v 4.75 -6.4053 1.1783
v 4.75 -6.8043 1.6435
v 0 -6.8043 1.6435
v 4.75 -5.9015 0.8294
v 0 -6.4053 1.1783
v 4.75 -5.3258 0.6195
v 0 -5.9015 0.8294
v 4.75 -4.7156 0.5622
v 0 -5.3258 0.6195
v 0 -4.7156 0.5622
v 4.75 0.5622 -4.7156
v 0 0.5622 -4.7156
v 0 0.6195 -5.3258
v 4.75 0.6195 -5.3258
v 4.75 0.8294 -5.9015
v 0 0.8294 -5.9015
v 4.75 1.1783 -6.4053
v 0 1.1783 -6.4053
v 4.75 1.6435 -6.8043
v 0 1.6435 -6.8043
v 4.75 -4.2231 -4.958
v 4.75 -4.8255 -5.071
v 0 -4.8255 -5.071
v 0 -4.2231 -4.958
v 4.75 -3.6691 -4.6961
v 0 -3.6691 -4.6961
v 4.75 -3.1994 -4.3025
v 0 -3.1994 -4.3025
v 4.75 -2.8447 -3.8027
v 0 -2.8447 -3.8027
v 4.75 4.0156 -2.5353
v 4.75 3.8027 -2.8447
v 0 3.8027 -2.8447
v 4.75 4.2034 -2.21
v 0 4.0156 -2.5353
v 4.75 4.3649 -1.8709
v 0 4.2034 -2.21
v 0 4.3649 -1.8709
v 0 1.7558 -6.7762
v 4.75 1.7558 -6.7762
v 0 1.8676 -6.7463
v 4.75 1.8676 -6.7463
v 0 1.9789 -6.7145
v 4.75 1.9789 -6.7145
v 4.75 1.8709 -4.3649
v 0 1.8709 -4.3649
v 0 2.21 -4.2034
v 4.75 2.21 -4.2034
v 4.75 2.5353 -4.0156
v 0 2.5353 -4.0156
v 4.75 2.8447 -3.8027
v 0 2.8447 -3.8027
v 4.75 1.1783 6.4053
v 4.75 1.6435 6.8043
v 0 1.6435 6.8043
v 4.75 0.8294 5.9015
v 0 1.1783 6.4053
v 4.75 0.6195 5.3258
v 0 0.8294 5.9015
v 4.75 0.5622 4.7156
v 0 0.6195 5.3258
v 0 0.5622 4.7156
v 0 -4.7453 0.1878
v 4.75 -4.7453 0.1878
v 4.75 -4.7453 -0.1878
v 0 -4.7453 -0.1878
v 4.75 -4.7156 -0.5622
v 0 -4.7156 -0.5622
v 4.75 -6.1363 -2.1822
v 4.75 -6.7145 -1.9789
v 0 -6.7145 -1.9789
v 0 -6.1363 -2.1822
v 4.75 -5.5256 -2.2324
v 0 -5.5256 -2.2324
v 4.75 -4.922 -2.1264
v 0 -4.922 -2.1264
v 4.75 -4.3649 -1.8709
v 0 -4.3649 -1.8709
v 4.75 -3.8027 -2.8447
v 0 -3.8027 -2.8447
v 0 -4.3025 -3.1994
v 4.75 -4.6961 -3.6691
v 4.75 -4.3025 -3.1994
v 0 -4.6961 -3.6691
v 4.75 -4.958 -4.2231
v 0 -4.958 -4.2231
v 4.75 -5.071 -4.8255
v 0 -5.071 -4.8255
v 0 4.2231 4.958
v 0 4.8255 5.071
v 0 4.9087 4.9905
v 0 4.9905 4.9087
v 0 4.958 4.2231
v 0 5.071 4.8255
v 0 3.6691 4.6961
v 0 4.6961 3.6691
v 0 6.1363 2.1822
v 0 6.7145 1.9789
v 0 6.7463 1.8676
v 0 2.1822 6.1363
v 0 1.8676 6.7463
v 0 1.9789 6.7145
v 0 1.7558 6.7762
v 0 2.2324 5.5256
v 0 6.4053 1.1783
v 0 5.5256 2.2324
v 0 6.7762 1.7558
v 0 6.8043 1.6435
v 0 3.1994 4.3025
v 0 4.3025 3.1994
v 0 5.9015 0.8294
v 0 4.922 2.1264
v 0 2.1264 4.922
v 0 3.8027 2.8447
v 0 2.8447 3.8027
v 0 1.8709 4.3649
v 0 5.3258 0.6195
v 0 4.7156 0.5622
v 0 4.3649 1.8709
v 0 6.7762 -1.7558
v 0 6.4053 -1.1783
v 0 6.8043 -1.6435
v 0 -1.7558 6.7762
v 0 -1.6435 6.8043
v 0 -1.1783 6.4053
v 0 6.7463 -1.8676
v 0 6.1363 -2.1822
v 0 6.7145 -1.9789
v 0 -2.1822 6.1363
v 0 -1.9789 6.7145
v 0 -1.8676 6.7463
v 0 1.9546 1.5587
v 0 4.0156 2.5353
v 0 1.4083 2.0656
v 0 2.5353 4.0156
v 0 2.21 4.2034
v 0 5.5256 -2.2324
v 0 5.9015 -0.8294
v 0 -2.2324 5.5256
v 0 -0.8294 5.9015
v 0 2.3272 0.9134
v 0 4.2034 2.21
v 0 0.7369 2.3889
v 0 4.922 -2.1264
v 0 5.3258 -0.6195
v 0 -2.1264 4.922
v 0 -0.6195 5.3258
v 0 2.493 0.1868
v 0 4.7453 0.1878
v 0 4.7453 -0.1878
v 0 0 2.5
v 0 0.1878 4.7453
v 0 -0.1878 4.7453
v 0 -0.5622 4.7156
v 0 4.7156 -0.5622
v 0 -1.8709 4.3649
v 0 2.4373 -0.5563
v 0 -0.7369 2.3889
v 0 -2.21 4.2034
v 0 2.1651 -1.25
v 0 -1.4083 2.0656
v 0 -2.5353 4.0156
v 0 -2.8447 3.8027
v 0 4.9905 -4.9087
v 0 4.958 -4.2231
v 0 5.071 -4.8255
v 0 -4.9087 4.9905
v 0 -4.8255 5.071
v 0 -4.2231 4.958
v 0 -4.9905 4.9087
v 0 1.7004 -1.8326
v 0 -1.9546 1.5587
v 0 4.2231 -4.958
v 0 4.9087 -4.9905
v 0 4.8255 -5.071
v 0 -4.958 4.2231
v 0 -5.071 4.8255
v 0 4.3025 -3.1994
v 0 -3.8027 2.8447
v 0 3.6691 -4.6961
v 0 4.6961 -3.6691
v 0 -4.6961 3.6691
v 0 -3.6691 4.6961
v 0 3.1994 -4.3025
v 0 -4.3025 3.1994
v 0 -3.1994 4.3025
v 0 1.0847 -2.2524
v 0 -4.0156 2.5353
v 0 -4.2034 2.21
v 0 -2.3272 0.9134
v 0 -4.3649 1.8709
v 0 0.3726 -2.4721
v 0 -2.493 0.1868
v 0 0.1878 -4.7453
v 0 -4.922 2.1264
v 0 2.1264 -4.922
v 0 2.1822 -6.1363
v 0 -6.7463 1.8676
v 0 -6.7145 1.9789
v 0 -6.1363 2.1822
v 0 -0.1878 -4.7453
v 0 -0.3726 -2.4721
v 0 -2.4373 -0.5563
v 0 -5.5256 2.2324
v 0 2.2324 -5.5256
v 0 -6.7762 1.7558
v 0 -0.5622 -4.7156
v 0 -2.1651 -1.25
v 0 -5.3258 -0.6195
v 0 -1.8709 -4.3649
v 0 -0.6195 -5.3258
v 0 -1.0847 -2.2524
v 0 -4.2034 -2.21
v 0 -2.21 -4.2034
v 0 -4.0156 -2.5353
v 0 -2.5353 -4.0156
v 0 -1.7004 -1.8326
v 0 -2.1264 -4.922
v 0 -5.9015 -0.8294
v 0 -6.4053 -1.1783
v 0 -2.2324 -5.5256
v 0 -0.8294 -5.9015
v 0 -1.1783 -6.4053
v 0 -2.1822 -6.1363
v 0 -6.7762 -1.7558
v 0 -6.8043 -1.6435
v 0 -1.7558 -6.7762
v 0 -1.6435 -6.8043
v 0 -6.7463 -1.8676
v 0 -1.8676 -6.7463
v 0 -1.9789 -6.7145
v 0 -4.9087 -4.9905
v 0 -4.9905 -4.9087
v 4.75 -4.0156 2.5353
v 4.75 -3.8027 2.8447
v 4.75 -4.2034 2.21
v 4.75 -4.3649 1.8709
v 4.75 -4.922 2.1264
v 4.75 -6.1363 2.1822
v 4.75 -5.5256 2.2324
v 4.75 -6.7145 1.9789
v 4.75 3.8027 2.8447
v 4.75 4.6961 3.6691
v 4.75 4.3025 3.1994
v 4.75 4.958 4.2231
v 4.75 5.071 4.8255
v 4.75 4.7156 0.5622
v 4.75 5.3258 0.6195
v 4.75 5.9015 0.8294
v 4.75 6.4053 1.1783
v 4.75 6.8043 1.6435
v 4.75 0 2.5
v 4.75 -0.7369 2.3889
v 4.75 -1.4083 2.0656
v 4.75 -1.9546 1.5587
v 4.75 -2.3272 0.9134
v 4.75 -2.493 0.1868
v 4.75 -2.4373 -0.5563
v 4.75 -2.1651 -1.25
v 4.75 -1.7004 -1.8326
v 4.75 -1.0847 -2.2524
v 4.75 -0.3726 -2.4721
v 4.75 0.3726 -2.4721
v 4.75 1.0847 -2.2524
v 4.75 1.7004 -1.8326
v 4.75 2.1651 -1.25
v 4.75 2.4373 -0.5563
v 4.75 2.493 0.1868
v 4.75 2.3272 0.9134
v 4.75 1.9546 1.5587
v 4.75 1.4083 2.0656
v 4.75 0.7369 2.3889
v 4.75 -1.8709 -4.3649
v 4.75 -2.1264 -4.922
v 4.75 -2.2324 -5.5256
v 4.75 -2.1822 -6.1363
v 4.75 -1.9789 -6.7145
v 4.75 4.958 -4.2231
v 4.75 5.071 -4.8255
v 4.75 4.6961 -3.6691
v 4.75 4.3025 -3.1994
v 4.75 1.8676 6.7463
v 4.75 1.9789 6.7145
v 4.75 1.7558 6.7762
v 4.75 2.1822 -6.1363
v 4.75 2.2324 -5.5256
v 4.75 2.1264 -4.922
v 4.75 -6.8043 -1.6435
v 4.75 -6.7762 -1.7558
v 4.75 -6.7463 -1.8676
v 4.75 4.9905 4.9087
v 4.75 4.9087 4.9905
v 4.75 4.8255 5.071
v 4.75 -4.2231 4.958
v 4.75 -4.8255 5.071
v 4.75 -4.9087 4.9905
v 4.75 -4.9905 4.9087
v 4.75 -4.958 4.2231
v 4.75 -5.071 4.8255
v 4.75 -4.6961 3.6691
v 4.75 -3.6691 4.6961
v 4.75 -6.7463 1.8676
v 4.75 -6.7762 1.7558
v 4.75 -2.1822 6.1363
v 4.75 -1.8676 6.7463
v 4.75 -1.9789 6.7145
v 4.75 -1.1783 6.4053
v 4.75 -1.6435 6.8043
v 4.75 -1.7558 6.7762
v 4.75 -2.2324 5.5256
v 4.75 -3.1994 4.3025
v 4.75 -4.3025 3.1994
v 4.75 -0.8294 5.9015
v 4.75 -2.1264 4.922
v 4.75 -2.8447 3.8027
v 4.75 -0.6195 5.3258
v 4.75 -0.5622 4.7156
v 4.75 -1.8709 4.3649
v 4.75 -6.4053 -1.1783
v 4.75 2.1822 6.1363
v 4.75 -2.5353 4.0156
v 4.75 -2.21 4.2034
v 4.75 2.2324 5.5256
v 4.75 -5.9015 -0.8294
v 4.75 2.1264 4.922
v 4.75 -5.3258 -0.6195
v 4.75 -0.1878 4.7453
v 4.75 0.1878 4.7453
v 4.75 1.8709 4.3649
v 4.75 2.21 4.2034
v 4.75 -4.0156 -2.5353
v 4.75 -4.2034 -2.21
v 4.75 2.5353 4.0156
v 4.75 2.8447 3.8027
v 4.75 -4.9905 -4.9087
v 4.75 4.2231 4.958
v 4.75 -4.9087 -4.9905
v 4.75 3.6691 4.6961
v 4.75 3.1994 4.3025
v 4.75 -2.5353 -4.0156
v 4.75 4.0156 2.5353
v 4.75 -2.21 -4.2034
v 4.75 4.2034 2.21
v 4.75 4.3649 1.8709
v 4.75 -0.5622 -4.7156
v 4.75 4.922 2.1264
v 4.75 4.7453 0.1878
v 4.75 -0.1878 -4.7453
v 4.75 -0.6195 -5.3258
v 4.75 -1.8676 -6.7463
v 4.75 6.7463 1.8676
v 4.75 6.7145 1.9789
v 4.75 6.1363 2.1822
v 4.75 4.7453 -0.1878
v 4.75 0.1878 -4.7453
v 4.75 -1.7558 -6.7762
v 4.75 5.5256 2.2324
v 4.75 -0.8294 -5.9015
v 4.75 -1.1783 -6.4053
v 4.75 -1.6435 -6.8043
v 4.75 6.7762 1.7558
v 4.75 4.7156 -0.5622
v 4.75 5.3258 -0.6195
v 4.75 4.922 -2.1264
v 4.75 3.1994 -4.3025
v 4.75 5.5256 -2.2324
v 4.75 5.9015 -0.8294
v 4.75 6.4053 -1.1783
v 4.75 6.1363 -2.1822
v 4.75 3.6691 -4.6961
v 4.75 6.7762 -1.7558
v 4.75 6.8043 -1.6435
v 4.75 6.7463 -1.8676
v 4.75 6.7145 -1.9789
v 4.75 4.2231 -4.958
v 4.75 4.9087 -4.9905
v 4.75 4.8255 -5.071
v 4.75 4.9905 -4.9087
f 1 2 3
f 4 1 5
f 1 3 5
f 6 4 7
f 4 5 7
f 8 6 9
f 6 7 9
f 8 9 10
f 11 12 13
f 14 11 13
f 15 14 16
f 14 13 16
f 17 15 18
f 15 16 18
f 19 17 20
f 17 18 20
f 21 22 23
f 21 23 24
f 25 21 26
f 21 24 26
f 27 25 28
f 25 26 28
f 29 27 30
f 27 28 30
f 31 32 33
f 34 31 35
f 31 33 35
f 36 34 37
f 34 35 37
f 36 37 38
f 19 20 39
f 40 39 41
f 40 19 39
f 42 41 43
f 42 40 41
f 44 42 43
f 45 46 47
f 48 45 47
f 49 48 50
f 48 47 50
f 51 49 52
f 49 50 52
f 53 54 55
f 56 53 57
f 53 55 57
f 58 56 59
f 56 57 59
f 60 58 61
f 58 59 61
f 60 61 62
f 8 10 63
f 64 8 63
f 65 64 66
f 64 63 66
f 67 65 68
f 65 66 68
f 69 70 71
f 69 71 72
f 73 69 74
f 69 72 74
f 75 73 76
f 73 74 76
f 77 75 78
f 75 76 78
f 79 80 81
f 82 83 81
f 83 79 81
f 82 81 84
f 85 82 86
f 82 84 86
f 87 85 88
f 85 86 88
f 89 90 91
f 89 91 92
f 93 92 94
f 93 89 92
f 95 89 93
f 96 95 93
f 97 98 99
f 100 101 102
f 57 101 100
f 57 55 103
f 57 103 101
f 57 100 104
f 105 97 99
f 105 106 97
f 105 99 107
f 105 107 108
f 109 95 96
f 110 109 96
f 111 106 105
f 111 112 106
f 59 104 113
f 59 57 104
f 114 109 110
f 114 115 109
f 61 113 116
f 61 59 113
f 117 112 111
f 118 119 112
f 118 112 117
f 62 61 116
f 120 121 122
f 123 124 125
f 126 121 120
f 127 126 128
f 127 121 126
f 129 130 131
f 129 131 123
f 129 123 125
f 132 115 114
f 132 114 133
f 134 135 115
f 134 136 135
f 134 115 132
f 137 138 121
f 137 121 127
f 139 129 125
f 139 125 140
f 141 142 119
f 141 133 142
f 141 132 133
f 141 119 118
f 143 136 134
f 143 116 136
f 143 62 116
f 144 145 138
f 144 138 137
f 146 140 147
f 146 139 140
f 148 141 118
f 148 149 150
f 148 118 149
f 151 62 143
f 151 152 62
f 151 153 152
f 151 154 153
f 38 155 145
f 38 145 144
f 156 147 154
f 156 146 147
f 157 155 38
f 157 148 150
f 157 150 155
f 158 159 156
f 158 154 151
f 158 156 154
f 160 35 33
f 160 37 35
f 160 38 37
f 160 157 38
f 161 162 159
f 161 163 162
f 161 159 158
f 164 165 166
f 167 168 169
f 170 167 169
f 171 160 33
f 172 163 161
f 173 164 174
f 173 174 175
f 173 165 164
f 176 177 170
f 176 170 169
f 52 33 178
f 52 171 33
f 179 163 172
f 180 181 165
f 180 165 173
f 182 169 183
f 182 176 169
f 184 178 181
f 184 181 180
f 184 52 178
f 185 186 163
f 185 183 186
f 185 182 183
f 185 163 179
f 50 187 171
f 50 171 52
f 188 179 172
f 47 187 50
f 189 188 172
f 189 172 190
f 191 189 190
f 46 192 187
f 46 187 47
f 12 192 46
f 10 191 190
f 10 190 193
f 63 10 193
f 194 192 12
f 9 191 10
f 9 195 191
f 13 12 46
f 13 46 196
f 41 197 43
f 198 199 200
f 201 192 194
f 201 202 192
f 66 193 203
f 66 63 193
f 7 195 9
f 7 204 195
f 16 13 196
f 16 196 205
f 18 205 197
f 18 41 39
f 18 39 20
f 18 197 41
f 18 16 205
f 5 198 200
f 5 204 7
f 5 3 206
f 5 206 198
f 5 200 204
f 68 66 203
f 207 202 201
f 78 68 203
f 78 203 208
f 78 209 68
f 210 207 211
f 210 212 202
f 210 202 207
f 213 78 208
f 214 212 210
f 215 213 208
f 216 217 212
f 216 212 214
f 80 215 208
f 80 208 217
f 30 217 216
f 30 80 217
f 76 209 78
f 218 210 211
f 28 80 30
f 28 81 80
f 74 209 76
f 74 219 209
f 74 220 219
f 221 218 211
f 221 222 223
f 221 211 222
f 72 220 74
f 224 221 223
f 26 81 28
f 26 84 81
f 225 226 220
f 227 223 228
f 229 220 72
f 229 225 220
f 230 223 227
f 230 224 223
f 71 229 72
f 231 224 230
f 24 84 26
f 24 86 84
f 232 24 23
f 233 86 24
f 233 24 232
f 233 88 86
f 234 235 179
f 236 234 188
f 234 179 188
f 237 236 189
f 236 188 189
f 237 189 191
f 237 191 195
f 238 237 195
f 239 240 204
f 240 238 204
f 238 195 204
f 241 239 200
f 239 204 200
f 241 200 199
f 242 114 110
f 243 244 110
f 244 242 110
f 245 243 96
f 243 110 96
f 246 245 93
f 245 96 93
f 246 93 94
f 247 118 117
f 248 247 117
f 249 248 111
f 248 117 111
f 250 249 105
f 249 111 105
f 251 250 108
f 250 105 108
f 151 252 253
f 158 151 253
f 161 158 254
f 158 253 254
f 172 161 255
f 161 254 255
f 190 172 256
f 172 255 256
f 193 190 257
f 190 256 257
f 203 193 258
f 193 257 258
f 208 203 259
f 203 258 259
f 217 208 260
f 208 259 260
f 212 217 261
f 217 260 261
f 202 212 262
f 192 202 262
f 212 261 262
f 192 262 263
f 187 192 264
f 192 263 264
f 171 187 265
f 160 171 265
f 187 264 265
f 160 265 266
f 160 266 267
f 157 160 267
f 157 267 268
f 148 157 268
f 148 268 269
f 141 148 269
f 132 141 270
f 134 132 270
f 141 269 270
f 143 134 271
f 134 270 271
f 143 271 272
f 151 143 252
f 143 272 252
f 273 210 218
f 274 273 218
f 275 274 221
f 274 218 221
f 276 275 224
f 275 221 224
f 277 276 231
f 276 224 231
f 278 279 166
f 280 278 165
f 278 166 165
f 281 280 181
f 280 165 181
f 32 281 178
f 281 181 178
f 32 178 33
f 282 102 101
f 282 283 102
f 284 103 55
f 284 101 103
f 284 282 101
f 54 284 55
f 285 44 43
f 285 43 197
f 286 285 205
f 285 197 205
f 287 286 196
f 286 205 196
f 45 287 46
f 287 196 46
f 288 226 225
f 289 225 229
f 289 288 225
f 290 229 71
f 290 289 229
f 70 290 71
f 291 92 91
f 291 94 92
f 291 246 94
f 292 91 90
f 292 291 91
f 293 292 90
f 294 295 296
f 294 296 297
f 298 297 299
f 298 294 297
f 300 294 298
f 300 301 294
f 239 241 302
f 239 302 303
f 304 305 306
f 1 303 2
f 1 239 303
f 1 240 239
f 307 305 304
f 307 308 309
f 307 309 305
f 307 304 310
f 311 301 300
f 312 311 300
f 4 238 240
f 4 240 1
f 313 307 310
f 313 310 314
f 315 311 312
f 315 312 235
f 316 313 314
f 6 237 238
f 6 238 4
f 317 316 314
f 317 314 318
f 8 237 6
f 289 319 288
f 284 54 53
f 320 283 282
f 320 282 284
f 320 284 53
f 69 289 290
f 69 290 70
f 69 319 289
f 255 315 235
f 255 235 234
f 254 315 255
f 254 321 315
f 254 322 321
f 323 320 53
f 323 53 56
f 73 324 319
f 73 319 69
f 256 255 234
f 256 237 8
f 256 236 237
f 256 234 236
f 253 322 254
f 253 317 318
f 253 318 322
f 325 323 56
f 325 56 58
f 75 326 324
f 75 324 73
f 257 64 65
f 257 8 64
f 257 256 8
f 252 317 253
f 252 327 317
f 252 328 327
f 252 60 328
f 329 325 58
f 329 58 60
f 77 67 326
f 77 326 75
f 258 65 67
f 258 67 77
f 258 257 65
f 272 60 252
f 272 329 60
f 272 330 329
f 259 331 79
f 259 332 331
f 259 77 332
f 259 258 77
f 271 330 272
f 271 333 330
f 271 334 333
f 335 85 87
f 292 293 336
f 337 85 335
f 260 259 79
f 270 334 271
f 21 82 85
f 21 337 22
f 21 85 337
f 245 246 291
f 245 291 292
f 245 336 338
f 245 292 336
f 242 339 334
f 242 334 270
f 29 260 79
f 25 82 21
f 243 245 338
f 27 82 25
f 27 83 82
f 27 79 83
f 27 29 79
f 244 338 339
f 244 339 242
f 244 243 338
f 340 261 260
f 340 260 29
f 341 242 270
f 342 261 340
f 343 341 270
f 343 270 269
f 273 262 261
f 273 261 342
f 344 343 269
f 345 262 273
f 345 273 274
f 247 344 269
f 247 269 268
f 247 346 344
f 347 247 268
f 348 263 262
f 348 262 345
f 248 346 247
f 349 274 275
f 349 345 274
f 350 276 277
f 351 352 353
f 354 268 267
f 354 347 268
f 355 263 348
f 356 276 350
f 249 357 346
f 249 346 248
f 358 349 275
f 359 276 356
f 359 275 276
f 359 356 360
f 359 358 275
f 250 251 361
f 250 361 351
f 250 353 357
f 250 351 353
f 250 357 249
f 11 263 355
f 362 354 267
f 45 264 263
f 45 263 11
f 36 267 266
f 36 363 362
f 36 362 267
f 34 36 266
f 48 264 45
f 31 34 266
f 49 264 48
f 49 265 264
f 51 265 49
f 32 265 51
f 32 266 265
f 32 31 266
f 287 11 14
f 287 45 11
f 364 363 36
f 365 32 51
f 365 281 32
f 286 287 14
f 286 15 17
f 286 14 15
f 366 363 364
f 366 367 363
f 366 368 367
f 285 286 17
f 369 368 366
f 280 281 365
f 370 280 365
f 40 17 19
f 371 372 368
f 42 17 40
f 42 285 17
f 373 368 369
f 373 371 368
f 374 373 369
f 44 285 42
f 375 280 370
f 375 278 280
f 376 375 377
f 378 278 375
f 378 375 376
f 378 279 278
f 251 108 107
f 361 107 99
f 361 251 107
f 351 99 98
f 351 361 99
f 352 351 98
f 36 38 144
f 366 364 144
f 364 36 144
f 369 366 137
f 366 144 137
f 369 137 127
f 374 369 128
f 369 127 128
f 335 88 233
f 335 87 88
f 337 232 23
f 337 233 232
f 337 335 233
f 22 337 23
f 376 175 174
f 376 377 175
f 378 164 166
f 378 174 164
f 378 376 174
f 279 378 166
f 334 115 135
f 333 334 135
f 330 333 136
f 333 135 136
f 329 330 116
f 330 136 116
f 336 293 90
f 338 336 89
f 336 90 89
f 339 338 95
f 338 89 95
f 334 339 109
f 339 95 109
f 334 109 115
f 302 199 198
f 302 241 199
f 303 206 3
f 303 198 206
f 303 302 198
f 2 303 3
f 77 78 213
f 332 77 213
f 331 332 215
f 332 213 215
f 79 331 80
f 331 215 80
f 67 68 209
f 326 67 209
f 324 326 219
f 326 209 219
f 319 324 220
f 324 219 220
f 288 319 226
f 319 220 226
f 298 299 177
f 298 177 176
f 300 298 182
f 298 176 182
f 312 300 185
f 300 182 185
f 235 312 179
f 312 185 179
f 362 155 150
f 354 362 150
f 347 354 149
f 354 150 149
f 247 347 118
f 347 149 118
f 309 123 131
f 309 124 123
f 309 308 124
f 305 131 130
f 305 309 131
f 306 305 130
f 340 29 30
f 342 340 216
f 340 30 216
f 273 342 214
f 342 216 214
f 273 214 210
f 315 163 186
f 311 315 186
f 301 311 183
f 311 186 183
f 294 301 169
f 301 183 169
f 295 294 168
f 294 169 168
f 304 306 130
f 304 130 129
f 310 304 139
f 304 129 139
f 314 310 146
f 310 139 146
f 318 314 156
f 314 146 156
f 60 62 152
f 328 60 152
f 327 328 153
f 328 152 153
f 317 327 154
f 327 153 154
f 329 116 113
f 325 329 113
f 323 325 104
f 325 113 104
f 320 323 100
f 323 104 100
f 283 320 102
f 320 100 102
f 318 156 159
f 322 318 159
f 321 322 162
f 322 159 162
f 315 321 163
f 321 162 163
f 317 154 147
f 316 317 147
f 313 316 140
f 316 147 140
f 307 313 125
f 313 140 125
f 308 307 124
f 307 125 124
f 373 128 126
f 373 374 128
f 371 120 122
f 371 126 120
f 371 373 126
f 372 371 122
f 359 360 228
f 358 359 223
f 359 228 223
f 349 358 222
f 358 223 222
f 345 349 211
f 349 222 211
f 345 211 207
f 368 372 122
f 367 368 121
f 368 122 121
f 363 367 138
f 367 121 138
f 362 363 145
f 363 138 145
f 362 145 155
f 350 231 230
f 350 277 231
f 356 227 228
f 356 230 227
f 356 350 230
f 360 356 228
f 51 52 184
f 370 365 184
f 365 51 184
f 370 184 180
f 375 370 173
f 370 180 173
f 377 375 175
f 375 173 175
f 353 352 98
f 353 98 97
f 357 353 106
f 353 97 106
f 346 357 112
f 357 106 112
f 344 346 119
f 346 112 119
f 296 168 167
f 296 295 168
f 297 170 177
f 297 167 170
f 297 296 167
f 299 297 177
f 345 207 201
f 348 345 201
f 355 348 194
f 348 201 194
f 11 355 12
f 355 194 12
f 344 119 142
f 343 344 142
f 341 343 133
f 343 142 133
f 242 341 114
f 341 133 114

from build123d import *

# Parameters (mm, degrees)
BASPROSKE_W        = 5
BASPROSKE_H        = 7
TOOTHCUT_DEPTH     = 12.090536506
TEETHCUTS_COUNT    = 12
TEETHCUTS_ANGLE    = 330
BORSKE_R           = 2.5
BORE_DEPTH         = 50.0000508
SKETCH1_W          = 20.08971131
SKETCH1_H          = 17.337649252
CUT_EXTRUDE3_DEPTH = 0.25


with BuildPart() as part:
    # BasProSke → Base-Revolve (revolve)
    with BuildSketch(Plane(origin=(0, 0, 0), x_dir=(1, 0, 0), z_dir=(0, 1, 0)), mode=Mode.PRIVATE) as base_revolve_sk:
        with Locations((2.5, 3.5)):
            Rectangle(BASPROSKE_W, BASPROSKE_H)
    revolve(base_revolve_sk.sketch.rotate(Axis((-10, 0, 0), (1, 0, 0)), 180), axis=Axis((-10, 0, 0), (1, 0, 0)))

    # TooCutSke → ToothCut (cut, through all)
    with BuildSketch(Plane(origin=(0, 0, 0), x_dir=(0, 0, -1), z_dir=(1, 0, 0))):
        with BuildLine():
            ThreePointArc((0.562207301, 4.715604304), (0, 4.749), (-0.562207301, 4.715604304))
            ThreePointArc((-0.562207301, 4.715604304), (-0.837528627, 5.917009812), (-1.672850686, 6.823328788))
            ThreePointArc((-1.672850686, 6.823328788), (0, 7.0254), (1.672850686, 6.823328788))
            ThreePointArc((1.672850686, 6.823328788), (0.837528627, 5.917009812), (0.562207301, 4.715604304))
        make_face()
    toothcut = extrude(amount=TOOTHCUT_DEPTH, mode=Mode.SUBTRACT)

    # TeethCuts: ToothCut ×12 about axis
    teethcuts_axis = Axis((-10, 0, 0), (1, 0, 0))
    for i in range(1, TEETHCUTS_COUNT):
        add(toothcut.rotate(teethcuts_axis, i * TEETHCUTS_ANGLE / (TEETHCUTS_COUNT - 1)), mode=Mode.SUBTRACT)

    # BorSke → Bore (cut, symmetric)
    with BuildSketch(Plane(origin=(0, 0, 0), x_dir=(0, 0, -1), z_dir=(1, 0, 0))):
        with Locations(Location((0, 0, 0), (0, 0, 180))):
            Circle(BORSKE_R)
    extrude(amount=BORE_DEPTH, both=True, mode=Mode.SUBTRACT)

    # Sketch1 → Cut-Extrude3 (cut)
    with BuildSketch(Plane(origin=(5, 0, 0), x_dir=(0, 0, -1), z_dir=(1, 0, 0))):
        with Locations((2.500843807, -0.387105296)):
            Rectangle(SKETCH1_W, SKETCH1_H)
    extrude(amount=-CUT_EXTRUDE3_DEPTH, mode=Mode.SUBTRACT)


solid = part.part
